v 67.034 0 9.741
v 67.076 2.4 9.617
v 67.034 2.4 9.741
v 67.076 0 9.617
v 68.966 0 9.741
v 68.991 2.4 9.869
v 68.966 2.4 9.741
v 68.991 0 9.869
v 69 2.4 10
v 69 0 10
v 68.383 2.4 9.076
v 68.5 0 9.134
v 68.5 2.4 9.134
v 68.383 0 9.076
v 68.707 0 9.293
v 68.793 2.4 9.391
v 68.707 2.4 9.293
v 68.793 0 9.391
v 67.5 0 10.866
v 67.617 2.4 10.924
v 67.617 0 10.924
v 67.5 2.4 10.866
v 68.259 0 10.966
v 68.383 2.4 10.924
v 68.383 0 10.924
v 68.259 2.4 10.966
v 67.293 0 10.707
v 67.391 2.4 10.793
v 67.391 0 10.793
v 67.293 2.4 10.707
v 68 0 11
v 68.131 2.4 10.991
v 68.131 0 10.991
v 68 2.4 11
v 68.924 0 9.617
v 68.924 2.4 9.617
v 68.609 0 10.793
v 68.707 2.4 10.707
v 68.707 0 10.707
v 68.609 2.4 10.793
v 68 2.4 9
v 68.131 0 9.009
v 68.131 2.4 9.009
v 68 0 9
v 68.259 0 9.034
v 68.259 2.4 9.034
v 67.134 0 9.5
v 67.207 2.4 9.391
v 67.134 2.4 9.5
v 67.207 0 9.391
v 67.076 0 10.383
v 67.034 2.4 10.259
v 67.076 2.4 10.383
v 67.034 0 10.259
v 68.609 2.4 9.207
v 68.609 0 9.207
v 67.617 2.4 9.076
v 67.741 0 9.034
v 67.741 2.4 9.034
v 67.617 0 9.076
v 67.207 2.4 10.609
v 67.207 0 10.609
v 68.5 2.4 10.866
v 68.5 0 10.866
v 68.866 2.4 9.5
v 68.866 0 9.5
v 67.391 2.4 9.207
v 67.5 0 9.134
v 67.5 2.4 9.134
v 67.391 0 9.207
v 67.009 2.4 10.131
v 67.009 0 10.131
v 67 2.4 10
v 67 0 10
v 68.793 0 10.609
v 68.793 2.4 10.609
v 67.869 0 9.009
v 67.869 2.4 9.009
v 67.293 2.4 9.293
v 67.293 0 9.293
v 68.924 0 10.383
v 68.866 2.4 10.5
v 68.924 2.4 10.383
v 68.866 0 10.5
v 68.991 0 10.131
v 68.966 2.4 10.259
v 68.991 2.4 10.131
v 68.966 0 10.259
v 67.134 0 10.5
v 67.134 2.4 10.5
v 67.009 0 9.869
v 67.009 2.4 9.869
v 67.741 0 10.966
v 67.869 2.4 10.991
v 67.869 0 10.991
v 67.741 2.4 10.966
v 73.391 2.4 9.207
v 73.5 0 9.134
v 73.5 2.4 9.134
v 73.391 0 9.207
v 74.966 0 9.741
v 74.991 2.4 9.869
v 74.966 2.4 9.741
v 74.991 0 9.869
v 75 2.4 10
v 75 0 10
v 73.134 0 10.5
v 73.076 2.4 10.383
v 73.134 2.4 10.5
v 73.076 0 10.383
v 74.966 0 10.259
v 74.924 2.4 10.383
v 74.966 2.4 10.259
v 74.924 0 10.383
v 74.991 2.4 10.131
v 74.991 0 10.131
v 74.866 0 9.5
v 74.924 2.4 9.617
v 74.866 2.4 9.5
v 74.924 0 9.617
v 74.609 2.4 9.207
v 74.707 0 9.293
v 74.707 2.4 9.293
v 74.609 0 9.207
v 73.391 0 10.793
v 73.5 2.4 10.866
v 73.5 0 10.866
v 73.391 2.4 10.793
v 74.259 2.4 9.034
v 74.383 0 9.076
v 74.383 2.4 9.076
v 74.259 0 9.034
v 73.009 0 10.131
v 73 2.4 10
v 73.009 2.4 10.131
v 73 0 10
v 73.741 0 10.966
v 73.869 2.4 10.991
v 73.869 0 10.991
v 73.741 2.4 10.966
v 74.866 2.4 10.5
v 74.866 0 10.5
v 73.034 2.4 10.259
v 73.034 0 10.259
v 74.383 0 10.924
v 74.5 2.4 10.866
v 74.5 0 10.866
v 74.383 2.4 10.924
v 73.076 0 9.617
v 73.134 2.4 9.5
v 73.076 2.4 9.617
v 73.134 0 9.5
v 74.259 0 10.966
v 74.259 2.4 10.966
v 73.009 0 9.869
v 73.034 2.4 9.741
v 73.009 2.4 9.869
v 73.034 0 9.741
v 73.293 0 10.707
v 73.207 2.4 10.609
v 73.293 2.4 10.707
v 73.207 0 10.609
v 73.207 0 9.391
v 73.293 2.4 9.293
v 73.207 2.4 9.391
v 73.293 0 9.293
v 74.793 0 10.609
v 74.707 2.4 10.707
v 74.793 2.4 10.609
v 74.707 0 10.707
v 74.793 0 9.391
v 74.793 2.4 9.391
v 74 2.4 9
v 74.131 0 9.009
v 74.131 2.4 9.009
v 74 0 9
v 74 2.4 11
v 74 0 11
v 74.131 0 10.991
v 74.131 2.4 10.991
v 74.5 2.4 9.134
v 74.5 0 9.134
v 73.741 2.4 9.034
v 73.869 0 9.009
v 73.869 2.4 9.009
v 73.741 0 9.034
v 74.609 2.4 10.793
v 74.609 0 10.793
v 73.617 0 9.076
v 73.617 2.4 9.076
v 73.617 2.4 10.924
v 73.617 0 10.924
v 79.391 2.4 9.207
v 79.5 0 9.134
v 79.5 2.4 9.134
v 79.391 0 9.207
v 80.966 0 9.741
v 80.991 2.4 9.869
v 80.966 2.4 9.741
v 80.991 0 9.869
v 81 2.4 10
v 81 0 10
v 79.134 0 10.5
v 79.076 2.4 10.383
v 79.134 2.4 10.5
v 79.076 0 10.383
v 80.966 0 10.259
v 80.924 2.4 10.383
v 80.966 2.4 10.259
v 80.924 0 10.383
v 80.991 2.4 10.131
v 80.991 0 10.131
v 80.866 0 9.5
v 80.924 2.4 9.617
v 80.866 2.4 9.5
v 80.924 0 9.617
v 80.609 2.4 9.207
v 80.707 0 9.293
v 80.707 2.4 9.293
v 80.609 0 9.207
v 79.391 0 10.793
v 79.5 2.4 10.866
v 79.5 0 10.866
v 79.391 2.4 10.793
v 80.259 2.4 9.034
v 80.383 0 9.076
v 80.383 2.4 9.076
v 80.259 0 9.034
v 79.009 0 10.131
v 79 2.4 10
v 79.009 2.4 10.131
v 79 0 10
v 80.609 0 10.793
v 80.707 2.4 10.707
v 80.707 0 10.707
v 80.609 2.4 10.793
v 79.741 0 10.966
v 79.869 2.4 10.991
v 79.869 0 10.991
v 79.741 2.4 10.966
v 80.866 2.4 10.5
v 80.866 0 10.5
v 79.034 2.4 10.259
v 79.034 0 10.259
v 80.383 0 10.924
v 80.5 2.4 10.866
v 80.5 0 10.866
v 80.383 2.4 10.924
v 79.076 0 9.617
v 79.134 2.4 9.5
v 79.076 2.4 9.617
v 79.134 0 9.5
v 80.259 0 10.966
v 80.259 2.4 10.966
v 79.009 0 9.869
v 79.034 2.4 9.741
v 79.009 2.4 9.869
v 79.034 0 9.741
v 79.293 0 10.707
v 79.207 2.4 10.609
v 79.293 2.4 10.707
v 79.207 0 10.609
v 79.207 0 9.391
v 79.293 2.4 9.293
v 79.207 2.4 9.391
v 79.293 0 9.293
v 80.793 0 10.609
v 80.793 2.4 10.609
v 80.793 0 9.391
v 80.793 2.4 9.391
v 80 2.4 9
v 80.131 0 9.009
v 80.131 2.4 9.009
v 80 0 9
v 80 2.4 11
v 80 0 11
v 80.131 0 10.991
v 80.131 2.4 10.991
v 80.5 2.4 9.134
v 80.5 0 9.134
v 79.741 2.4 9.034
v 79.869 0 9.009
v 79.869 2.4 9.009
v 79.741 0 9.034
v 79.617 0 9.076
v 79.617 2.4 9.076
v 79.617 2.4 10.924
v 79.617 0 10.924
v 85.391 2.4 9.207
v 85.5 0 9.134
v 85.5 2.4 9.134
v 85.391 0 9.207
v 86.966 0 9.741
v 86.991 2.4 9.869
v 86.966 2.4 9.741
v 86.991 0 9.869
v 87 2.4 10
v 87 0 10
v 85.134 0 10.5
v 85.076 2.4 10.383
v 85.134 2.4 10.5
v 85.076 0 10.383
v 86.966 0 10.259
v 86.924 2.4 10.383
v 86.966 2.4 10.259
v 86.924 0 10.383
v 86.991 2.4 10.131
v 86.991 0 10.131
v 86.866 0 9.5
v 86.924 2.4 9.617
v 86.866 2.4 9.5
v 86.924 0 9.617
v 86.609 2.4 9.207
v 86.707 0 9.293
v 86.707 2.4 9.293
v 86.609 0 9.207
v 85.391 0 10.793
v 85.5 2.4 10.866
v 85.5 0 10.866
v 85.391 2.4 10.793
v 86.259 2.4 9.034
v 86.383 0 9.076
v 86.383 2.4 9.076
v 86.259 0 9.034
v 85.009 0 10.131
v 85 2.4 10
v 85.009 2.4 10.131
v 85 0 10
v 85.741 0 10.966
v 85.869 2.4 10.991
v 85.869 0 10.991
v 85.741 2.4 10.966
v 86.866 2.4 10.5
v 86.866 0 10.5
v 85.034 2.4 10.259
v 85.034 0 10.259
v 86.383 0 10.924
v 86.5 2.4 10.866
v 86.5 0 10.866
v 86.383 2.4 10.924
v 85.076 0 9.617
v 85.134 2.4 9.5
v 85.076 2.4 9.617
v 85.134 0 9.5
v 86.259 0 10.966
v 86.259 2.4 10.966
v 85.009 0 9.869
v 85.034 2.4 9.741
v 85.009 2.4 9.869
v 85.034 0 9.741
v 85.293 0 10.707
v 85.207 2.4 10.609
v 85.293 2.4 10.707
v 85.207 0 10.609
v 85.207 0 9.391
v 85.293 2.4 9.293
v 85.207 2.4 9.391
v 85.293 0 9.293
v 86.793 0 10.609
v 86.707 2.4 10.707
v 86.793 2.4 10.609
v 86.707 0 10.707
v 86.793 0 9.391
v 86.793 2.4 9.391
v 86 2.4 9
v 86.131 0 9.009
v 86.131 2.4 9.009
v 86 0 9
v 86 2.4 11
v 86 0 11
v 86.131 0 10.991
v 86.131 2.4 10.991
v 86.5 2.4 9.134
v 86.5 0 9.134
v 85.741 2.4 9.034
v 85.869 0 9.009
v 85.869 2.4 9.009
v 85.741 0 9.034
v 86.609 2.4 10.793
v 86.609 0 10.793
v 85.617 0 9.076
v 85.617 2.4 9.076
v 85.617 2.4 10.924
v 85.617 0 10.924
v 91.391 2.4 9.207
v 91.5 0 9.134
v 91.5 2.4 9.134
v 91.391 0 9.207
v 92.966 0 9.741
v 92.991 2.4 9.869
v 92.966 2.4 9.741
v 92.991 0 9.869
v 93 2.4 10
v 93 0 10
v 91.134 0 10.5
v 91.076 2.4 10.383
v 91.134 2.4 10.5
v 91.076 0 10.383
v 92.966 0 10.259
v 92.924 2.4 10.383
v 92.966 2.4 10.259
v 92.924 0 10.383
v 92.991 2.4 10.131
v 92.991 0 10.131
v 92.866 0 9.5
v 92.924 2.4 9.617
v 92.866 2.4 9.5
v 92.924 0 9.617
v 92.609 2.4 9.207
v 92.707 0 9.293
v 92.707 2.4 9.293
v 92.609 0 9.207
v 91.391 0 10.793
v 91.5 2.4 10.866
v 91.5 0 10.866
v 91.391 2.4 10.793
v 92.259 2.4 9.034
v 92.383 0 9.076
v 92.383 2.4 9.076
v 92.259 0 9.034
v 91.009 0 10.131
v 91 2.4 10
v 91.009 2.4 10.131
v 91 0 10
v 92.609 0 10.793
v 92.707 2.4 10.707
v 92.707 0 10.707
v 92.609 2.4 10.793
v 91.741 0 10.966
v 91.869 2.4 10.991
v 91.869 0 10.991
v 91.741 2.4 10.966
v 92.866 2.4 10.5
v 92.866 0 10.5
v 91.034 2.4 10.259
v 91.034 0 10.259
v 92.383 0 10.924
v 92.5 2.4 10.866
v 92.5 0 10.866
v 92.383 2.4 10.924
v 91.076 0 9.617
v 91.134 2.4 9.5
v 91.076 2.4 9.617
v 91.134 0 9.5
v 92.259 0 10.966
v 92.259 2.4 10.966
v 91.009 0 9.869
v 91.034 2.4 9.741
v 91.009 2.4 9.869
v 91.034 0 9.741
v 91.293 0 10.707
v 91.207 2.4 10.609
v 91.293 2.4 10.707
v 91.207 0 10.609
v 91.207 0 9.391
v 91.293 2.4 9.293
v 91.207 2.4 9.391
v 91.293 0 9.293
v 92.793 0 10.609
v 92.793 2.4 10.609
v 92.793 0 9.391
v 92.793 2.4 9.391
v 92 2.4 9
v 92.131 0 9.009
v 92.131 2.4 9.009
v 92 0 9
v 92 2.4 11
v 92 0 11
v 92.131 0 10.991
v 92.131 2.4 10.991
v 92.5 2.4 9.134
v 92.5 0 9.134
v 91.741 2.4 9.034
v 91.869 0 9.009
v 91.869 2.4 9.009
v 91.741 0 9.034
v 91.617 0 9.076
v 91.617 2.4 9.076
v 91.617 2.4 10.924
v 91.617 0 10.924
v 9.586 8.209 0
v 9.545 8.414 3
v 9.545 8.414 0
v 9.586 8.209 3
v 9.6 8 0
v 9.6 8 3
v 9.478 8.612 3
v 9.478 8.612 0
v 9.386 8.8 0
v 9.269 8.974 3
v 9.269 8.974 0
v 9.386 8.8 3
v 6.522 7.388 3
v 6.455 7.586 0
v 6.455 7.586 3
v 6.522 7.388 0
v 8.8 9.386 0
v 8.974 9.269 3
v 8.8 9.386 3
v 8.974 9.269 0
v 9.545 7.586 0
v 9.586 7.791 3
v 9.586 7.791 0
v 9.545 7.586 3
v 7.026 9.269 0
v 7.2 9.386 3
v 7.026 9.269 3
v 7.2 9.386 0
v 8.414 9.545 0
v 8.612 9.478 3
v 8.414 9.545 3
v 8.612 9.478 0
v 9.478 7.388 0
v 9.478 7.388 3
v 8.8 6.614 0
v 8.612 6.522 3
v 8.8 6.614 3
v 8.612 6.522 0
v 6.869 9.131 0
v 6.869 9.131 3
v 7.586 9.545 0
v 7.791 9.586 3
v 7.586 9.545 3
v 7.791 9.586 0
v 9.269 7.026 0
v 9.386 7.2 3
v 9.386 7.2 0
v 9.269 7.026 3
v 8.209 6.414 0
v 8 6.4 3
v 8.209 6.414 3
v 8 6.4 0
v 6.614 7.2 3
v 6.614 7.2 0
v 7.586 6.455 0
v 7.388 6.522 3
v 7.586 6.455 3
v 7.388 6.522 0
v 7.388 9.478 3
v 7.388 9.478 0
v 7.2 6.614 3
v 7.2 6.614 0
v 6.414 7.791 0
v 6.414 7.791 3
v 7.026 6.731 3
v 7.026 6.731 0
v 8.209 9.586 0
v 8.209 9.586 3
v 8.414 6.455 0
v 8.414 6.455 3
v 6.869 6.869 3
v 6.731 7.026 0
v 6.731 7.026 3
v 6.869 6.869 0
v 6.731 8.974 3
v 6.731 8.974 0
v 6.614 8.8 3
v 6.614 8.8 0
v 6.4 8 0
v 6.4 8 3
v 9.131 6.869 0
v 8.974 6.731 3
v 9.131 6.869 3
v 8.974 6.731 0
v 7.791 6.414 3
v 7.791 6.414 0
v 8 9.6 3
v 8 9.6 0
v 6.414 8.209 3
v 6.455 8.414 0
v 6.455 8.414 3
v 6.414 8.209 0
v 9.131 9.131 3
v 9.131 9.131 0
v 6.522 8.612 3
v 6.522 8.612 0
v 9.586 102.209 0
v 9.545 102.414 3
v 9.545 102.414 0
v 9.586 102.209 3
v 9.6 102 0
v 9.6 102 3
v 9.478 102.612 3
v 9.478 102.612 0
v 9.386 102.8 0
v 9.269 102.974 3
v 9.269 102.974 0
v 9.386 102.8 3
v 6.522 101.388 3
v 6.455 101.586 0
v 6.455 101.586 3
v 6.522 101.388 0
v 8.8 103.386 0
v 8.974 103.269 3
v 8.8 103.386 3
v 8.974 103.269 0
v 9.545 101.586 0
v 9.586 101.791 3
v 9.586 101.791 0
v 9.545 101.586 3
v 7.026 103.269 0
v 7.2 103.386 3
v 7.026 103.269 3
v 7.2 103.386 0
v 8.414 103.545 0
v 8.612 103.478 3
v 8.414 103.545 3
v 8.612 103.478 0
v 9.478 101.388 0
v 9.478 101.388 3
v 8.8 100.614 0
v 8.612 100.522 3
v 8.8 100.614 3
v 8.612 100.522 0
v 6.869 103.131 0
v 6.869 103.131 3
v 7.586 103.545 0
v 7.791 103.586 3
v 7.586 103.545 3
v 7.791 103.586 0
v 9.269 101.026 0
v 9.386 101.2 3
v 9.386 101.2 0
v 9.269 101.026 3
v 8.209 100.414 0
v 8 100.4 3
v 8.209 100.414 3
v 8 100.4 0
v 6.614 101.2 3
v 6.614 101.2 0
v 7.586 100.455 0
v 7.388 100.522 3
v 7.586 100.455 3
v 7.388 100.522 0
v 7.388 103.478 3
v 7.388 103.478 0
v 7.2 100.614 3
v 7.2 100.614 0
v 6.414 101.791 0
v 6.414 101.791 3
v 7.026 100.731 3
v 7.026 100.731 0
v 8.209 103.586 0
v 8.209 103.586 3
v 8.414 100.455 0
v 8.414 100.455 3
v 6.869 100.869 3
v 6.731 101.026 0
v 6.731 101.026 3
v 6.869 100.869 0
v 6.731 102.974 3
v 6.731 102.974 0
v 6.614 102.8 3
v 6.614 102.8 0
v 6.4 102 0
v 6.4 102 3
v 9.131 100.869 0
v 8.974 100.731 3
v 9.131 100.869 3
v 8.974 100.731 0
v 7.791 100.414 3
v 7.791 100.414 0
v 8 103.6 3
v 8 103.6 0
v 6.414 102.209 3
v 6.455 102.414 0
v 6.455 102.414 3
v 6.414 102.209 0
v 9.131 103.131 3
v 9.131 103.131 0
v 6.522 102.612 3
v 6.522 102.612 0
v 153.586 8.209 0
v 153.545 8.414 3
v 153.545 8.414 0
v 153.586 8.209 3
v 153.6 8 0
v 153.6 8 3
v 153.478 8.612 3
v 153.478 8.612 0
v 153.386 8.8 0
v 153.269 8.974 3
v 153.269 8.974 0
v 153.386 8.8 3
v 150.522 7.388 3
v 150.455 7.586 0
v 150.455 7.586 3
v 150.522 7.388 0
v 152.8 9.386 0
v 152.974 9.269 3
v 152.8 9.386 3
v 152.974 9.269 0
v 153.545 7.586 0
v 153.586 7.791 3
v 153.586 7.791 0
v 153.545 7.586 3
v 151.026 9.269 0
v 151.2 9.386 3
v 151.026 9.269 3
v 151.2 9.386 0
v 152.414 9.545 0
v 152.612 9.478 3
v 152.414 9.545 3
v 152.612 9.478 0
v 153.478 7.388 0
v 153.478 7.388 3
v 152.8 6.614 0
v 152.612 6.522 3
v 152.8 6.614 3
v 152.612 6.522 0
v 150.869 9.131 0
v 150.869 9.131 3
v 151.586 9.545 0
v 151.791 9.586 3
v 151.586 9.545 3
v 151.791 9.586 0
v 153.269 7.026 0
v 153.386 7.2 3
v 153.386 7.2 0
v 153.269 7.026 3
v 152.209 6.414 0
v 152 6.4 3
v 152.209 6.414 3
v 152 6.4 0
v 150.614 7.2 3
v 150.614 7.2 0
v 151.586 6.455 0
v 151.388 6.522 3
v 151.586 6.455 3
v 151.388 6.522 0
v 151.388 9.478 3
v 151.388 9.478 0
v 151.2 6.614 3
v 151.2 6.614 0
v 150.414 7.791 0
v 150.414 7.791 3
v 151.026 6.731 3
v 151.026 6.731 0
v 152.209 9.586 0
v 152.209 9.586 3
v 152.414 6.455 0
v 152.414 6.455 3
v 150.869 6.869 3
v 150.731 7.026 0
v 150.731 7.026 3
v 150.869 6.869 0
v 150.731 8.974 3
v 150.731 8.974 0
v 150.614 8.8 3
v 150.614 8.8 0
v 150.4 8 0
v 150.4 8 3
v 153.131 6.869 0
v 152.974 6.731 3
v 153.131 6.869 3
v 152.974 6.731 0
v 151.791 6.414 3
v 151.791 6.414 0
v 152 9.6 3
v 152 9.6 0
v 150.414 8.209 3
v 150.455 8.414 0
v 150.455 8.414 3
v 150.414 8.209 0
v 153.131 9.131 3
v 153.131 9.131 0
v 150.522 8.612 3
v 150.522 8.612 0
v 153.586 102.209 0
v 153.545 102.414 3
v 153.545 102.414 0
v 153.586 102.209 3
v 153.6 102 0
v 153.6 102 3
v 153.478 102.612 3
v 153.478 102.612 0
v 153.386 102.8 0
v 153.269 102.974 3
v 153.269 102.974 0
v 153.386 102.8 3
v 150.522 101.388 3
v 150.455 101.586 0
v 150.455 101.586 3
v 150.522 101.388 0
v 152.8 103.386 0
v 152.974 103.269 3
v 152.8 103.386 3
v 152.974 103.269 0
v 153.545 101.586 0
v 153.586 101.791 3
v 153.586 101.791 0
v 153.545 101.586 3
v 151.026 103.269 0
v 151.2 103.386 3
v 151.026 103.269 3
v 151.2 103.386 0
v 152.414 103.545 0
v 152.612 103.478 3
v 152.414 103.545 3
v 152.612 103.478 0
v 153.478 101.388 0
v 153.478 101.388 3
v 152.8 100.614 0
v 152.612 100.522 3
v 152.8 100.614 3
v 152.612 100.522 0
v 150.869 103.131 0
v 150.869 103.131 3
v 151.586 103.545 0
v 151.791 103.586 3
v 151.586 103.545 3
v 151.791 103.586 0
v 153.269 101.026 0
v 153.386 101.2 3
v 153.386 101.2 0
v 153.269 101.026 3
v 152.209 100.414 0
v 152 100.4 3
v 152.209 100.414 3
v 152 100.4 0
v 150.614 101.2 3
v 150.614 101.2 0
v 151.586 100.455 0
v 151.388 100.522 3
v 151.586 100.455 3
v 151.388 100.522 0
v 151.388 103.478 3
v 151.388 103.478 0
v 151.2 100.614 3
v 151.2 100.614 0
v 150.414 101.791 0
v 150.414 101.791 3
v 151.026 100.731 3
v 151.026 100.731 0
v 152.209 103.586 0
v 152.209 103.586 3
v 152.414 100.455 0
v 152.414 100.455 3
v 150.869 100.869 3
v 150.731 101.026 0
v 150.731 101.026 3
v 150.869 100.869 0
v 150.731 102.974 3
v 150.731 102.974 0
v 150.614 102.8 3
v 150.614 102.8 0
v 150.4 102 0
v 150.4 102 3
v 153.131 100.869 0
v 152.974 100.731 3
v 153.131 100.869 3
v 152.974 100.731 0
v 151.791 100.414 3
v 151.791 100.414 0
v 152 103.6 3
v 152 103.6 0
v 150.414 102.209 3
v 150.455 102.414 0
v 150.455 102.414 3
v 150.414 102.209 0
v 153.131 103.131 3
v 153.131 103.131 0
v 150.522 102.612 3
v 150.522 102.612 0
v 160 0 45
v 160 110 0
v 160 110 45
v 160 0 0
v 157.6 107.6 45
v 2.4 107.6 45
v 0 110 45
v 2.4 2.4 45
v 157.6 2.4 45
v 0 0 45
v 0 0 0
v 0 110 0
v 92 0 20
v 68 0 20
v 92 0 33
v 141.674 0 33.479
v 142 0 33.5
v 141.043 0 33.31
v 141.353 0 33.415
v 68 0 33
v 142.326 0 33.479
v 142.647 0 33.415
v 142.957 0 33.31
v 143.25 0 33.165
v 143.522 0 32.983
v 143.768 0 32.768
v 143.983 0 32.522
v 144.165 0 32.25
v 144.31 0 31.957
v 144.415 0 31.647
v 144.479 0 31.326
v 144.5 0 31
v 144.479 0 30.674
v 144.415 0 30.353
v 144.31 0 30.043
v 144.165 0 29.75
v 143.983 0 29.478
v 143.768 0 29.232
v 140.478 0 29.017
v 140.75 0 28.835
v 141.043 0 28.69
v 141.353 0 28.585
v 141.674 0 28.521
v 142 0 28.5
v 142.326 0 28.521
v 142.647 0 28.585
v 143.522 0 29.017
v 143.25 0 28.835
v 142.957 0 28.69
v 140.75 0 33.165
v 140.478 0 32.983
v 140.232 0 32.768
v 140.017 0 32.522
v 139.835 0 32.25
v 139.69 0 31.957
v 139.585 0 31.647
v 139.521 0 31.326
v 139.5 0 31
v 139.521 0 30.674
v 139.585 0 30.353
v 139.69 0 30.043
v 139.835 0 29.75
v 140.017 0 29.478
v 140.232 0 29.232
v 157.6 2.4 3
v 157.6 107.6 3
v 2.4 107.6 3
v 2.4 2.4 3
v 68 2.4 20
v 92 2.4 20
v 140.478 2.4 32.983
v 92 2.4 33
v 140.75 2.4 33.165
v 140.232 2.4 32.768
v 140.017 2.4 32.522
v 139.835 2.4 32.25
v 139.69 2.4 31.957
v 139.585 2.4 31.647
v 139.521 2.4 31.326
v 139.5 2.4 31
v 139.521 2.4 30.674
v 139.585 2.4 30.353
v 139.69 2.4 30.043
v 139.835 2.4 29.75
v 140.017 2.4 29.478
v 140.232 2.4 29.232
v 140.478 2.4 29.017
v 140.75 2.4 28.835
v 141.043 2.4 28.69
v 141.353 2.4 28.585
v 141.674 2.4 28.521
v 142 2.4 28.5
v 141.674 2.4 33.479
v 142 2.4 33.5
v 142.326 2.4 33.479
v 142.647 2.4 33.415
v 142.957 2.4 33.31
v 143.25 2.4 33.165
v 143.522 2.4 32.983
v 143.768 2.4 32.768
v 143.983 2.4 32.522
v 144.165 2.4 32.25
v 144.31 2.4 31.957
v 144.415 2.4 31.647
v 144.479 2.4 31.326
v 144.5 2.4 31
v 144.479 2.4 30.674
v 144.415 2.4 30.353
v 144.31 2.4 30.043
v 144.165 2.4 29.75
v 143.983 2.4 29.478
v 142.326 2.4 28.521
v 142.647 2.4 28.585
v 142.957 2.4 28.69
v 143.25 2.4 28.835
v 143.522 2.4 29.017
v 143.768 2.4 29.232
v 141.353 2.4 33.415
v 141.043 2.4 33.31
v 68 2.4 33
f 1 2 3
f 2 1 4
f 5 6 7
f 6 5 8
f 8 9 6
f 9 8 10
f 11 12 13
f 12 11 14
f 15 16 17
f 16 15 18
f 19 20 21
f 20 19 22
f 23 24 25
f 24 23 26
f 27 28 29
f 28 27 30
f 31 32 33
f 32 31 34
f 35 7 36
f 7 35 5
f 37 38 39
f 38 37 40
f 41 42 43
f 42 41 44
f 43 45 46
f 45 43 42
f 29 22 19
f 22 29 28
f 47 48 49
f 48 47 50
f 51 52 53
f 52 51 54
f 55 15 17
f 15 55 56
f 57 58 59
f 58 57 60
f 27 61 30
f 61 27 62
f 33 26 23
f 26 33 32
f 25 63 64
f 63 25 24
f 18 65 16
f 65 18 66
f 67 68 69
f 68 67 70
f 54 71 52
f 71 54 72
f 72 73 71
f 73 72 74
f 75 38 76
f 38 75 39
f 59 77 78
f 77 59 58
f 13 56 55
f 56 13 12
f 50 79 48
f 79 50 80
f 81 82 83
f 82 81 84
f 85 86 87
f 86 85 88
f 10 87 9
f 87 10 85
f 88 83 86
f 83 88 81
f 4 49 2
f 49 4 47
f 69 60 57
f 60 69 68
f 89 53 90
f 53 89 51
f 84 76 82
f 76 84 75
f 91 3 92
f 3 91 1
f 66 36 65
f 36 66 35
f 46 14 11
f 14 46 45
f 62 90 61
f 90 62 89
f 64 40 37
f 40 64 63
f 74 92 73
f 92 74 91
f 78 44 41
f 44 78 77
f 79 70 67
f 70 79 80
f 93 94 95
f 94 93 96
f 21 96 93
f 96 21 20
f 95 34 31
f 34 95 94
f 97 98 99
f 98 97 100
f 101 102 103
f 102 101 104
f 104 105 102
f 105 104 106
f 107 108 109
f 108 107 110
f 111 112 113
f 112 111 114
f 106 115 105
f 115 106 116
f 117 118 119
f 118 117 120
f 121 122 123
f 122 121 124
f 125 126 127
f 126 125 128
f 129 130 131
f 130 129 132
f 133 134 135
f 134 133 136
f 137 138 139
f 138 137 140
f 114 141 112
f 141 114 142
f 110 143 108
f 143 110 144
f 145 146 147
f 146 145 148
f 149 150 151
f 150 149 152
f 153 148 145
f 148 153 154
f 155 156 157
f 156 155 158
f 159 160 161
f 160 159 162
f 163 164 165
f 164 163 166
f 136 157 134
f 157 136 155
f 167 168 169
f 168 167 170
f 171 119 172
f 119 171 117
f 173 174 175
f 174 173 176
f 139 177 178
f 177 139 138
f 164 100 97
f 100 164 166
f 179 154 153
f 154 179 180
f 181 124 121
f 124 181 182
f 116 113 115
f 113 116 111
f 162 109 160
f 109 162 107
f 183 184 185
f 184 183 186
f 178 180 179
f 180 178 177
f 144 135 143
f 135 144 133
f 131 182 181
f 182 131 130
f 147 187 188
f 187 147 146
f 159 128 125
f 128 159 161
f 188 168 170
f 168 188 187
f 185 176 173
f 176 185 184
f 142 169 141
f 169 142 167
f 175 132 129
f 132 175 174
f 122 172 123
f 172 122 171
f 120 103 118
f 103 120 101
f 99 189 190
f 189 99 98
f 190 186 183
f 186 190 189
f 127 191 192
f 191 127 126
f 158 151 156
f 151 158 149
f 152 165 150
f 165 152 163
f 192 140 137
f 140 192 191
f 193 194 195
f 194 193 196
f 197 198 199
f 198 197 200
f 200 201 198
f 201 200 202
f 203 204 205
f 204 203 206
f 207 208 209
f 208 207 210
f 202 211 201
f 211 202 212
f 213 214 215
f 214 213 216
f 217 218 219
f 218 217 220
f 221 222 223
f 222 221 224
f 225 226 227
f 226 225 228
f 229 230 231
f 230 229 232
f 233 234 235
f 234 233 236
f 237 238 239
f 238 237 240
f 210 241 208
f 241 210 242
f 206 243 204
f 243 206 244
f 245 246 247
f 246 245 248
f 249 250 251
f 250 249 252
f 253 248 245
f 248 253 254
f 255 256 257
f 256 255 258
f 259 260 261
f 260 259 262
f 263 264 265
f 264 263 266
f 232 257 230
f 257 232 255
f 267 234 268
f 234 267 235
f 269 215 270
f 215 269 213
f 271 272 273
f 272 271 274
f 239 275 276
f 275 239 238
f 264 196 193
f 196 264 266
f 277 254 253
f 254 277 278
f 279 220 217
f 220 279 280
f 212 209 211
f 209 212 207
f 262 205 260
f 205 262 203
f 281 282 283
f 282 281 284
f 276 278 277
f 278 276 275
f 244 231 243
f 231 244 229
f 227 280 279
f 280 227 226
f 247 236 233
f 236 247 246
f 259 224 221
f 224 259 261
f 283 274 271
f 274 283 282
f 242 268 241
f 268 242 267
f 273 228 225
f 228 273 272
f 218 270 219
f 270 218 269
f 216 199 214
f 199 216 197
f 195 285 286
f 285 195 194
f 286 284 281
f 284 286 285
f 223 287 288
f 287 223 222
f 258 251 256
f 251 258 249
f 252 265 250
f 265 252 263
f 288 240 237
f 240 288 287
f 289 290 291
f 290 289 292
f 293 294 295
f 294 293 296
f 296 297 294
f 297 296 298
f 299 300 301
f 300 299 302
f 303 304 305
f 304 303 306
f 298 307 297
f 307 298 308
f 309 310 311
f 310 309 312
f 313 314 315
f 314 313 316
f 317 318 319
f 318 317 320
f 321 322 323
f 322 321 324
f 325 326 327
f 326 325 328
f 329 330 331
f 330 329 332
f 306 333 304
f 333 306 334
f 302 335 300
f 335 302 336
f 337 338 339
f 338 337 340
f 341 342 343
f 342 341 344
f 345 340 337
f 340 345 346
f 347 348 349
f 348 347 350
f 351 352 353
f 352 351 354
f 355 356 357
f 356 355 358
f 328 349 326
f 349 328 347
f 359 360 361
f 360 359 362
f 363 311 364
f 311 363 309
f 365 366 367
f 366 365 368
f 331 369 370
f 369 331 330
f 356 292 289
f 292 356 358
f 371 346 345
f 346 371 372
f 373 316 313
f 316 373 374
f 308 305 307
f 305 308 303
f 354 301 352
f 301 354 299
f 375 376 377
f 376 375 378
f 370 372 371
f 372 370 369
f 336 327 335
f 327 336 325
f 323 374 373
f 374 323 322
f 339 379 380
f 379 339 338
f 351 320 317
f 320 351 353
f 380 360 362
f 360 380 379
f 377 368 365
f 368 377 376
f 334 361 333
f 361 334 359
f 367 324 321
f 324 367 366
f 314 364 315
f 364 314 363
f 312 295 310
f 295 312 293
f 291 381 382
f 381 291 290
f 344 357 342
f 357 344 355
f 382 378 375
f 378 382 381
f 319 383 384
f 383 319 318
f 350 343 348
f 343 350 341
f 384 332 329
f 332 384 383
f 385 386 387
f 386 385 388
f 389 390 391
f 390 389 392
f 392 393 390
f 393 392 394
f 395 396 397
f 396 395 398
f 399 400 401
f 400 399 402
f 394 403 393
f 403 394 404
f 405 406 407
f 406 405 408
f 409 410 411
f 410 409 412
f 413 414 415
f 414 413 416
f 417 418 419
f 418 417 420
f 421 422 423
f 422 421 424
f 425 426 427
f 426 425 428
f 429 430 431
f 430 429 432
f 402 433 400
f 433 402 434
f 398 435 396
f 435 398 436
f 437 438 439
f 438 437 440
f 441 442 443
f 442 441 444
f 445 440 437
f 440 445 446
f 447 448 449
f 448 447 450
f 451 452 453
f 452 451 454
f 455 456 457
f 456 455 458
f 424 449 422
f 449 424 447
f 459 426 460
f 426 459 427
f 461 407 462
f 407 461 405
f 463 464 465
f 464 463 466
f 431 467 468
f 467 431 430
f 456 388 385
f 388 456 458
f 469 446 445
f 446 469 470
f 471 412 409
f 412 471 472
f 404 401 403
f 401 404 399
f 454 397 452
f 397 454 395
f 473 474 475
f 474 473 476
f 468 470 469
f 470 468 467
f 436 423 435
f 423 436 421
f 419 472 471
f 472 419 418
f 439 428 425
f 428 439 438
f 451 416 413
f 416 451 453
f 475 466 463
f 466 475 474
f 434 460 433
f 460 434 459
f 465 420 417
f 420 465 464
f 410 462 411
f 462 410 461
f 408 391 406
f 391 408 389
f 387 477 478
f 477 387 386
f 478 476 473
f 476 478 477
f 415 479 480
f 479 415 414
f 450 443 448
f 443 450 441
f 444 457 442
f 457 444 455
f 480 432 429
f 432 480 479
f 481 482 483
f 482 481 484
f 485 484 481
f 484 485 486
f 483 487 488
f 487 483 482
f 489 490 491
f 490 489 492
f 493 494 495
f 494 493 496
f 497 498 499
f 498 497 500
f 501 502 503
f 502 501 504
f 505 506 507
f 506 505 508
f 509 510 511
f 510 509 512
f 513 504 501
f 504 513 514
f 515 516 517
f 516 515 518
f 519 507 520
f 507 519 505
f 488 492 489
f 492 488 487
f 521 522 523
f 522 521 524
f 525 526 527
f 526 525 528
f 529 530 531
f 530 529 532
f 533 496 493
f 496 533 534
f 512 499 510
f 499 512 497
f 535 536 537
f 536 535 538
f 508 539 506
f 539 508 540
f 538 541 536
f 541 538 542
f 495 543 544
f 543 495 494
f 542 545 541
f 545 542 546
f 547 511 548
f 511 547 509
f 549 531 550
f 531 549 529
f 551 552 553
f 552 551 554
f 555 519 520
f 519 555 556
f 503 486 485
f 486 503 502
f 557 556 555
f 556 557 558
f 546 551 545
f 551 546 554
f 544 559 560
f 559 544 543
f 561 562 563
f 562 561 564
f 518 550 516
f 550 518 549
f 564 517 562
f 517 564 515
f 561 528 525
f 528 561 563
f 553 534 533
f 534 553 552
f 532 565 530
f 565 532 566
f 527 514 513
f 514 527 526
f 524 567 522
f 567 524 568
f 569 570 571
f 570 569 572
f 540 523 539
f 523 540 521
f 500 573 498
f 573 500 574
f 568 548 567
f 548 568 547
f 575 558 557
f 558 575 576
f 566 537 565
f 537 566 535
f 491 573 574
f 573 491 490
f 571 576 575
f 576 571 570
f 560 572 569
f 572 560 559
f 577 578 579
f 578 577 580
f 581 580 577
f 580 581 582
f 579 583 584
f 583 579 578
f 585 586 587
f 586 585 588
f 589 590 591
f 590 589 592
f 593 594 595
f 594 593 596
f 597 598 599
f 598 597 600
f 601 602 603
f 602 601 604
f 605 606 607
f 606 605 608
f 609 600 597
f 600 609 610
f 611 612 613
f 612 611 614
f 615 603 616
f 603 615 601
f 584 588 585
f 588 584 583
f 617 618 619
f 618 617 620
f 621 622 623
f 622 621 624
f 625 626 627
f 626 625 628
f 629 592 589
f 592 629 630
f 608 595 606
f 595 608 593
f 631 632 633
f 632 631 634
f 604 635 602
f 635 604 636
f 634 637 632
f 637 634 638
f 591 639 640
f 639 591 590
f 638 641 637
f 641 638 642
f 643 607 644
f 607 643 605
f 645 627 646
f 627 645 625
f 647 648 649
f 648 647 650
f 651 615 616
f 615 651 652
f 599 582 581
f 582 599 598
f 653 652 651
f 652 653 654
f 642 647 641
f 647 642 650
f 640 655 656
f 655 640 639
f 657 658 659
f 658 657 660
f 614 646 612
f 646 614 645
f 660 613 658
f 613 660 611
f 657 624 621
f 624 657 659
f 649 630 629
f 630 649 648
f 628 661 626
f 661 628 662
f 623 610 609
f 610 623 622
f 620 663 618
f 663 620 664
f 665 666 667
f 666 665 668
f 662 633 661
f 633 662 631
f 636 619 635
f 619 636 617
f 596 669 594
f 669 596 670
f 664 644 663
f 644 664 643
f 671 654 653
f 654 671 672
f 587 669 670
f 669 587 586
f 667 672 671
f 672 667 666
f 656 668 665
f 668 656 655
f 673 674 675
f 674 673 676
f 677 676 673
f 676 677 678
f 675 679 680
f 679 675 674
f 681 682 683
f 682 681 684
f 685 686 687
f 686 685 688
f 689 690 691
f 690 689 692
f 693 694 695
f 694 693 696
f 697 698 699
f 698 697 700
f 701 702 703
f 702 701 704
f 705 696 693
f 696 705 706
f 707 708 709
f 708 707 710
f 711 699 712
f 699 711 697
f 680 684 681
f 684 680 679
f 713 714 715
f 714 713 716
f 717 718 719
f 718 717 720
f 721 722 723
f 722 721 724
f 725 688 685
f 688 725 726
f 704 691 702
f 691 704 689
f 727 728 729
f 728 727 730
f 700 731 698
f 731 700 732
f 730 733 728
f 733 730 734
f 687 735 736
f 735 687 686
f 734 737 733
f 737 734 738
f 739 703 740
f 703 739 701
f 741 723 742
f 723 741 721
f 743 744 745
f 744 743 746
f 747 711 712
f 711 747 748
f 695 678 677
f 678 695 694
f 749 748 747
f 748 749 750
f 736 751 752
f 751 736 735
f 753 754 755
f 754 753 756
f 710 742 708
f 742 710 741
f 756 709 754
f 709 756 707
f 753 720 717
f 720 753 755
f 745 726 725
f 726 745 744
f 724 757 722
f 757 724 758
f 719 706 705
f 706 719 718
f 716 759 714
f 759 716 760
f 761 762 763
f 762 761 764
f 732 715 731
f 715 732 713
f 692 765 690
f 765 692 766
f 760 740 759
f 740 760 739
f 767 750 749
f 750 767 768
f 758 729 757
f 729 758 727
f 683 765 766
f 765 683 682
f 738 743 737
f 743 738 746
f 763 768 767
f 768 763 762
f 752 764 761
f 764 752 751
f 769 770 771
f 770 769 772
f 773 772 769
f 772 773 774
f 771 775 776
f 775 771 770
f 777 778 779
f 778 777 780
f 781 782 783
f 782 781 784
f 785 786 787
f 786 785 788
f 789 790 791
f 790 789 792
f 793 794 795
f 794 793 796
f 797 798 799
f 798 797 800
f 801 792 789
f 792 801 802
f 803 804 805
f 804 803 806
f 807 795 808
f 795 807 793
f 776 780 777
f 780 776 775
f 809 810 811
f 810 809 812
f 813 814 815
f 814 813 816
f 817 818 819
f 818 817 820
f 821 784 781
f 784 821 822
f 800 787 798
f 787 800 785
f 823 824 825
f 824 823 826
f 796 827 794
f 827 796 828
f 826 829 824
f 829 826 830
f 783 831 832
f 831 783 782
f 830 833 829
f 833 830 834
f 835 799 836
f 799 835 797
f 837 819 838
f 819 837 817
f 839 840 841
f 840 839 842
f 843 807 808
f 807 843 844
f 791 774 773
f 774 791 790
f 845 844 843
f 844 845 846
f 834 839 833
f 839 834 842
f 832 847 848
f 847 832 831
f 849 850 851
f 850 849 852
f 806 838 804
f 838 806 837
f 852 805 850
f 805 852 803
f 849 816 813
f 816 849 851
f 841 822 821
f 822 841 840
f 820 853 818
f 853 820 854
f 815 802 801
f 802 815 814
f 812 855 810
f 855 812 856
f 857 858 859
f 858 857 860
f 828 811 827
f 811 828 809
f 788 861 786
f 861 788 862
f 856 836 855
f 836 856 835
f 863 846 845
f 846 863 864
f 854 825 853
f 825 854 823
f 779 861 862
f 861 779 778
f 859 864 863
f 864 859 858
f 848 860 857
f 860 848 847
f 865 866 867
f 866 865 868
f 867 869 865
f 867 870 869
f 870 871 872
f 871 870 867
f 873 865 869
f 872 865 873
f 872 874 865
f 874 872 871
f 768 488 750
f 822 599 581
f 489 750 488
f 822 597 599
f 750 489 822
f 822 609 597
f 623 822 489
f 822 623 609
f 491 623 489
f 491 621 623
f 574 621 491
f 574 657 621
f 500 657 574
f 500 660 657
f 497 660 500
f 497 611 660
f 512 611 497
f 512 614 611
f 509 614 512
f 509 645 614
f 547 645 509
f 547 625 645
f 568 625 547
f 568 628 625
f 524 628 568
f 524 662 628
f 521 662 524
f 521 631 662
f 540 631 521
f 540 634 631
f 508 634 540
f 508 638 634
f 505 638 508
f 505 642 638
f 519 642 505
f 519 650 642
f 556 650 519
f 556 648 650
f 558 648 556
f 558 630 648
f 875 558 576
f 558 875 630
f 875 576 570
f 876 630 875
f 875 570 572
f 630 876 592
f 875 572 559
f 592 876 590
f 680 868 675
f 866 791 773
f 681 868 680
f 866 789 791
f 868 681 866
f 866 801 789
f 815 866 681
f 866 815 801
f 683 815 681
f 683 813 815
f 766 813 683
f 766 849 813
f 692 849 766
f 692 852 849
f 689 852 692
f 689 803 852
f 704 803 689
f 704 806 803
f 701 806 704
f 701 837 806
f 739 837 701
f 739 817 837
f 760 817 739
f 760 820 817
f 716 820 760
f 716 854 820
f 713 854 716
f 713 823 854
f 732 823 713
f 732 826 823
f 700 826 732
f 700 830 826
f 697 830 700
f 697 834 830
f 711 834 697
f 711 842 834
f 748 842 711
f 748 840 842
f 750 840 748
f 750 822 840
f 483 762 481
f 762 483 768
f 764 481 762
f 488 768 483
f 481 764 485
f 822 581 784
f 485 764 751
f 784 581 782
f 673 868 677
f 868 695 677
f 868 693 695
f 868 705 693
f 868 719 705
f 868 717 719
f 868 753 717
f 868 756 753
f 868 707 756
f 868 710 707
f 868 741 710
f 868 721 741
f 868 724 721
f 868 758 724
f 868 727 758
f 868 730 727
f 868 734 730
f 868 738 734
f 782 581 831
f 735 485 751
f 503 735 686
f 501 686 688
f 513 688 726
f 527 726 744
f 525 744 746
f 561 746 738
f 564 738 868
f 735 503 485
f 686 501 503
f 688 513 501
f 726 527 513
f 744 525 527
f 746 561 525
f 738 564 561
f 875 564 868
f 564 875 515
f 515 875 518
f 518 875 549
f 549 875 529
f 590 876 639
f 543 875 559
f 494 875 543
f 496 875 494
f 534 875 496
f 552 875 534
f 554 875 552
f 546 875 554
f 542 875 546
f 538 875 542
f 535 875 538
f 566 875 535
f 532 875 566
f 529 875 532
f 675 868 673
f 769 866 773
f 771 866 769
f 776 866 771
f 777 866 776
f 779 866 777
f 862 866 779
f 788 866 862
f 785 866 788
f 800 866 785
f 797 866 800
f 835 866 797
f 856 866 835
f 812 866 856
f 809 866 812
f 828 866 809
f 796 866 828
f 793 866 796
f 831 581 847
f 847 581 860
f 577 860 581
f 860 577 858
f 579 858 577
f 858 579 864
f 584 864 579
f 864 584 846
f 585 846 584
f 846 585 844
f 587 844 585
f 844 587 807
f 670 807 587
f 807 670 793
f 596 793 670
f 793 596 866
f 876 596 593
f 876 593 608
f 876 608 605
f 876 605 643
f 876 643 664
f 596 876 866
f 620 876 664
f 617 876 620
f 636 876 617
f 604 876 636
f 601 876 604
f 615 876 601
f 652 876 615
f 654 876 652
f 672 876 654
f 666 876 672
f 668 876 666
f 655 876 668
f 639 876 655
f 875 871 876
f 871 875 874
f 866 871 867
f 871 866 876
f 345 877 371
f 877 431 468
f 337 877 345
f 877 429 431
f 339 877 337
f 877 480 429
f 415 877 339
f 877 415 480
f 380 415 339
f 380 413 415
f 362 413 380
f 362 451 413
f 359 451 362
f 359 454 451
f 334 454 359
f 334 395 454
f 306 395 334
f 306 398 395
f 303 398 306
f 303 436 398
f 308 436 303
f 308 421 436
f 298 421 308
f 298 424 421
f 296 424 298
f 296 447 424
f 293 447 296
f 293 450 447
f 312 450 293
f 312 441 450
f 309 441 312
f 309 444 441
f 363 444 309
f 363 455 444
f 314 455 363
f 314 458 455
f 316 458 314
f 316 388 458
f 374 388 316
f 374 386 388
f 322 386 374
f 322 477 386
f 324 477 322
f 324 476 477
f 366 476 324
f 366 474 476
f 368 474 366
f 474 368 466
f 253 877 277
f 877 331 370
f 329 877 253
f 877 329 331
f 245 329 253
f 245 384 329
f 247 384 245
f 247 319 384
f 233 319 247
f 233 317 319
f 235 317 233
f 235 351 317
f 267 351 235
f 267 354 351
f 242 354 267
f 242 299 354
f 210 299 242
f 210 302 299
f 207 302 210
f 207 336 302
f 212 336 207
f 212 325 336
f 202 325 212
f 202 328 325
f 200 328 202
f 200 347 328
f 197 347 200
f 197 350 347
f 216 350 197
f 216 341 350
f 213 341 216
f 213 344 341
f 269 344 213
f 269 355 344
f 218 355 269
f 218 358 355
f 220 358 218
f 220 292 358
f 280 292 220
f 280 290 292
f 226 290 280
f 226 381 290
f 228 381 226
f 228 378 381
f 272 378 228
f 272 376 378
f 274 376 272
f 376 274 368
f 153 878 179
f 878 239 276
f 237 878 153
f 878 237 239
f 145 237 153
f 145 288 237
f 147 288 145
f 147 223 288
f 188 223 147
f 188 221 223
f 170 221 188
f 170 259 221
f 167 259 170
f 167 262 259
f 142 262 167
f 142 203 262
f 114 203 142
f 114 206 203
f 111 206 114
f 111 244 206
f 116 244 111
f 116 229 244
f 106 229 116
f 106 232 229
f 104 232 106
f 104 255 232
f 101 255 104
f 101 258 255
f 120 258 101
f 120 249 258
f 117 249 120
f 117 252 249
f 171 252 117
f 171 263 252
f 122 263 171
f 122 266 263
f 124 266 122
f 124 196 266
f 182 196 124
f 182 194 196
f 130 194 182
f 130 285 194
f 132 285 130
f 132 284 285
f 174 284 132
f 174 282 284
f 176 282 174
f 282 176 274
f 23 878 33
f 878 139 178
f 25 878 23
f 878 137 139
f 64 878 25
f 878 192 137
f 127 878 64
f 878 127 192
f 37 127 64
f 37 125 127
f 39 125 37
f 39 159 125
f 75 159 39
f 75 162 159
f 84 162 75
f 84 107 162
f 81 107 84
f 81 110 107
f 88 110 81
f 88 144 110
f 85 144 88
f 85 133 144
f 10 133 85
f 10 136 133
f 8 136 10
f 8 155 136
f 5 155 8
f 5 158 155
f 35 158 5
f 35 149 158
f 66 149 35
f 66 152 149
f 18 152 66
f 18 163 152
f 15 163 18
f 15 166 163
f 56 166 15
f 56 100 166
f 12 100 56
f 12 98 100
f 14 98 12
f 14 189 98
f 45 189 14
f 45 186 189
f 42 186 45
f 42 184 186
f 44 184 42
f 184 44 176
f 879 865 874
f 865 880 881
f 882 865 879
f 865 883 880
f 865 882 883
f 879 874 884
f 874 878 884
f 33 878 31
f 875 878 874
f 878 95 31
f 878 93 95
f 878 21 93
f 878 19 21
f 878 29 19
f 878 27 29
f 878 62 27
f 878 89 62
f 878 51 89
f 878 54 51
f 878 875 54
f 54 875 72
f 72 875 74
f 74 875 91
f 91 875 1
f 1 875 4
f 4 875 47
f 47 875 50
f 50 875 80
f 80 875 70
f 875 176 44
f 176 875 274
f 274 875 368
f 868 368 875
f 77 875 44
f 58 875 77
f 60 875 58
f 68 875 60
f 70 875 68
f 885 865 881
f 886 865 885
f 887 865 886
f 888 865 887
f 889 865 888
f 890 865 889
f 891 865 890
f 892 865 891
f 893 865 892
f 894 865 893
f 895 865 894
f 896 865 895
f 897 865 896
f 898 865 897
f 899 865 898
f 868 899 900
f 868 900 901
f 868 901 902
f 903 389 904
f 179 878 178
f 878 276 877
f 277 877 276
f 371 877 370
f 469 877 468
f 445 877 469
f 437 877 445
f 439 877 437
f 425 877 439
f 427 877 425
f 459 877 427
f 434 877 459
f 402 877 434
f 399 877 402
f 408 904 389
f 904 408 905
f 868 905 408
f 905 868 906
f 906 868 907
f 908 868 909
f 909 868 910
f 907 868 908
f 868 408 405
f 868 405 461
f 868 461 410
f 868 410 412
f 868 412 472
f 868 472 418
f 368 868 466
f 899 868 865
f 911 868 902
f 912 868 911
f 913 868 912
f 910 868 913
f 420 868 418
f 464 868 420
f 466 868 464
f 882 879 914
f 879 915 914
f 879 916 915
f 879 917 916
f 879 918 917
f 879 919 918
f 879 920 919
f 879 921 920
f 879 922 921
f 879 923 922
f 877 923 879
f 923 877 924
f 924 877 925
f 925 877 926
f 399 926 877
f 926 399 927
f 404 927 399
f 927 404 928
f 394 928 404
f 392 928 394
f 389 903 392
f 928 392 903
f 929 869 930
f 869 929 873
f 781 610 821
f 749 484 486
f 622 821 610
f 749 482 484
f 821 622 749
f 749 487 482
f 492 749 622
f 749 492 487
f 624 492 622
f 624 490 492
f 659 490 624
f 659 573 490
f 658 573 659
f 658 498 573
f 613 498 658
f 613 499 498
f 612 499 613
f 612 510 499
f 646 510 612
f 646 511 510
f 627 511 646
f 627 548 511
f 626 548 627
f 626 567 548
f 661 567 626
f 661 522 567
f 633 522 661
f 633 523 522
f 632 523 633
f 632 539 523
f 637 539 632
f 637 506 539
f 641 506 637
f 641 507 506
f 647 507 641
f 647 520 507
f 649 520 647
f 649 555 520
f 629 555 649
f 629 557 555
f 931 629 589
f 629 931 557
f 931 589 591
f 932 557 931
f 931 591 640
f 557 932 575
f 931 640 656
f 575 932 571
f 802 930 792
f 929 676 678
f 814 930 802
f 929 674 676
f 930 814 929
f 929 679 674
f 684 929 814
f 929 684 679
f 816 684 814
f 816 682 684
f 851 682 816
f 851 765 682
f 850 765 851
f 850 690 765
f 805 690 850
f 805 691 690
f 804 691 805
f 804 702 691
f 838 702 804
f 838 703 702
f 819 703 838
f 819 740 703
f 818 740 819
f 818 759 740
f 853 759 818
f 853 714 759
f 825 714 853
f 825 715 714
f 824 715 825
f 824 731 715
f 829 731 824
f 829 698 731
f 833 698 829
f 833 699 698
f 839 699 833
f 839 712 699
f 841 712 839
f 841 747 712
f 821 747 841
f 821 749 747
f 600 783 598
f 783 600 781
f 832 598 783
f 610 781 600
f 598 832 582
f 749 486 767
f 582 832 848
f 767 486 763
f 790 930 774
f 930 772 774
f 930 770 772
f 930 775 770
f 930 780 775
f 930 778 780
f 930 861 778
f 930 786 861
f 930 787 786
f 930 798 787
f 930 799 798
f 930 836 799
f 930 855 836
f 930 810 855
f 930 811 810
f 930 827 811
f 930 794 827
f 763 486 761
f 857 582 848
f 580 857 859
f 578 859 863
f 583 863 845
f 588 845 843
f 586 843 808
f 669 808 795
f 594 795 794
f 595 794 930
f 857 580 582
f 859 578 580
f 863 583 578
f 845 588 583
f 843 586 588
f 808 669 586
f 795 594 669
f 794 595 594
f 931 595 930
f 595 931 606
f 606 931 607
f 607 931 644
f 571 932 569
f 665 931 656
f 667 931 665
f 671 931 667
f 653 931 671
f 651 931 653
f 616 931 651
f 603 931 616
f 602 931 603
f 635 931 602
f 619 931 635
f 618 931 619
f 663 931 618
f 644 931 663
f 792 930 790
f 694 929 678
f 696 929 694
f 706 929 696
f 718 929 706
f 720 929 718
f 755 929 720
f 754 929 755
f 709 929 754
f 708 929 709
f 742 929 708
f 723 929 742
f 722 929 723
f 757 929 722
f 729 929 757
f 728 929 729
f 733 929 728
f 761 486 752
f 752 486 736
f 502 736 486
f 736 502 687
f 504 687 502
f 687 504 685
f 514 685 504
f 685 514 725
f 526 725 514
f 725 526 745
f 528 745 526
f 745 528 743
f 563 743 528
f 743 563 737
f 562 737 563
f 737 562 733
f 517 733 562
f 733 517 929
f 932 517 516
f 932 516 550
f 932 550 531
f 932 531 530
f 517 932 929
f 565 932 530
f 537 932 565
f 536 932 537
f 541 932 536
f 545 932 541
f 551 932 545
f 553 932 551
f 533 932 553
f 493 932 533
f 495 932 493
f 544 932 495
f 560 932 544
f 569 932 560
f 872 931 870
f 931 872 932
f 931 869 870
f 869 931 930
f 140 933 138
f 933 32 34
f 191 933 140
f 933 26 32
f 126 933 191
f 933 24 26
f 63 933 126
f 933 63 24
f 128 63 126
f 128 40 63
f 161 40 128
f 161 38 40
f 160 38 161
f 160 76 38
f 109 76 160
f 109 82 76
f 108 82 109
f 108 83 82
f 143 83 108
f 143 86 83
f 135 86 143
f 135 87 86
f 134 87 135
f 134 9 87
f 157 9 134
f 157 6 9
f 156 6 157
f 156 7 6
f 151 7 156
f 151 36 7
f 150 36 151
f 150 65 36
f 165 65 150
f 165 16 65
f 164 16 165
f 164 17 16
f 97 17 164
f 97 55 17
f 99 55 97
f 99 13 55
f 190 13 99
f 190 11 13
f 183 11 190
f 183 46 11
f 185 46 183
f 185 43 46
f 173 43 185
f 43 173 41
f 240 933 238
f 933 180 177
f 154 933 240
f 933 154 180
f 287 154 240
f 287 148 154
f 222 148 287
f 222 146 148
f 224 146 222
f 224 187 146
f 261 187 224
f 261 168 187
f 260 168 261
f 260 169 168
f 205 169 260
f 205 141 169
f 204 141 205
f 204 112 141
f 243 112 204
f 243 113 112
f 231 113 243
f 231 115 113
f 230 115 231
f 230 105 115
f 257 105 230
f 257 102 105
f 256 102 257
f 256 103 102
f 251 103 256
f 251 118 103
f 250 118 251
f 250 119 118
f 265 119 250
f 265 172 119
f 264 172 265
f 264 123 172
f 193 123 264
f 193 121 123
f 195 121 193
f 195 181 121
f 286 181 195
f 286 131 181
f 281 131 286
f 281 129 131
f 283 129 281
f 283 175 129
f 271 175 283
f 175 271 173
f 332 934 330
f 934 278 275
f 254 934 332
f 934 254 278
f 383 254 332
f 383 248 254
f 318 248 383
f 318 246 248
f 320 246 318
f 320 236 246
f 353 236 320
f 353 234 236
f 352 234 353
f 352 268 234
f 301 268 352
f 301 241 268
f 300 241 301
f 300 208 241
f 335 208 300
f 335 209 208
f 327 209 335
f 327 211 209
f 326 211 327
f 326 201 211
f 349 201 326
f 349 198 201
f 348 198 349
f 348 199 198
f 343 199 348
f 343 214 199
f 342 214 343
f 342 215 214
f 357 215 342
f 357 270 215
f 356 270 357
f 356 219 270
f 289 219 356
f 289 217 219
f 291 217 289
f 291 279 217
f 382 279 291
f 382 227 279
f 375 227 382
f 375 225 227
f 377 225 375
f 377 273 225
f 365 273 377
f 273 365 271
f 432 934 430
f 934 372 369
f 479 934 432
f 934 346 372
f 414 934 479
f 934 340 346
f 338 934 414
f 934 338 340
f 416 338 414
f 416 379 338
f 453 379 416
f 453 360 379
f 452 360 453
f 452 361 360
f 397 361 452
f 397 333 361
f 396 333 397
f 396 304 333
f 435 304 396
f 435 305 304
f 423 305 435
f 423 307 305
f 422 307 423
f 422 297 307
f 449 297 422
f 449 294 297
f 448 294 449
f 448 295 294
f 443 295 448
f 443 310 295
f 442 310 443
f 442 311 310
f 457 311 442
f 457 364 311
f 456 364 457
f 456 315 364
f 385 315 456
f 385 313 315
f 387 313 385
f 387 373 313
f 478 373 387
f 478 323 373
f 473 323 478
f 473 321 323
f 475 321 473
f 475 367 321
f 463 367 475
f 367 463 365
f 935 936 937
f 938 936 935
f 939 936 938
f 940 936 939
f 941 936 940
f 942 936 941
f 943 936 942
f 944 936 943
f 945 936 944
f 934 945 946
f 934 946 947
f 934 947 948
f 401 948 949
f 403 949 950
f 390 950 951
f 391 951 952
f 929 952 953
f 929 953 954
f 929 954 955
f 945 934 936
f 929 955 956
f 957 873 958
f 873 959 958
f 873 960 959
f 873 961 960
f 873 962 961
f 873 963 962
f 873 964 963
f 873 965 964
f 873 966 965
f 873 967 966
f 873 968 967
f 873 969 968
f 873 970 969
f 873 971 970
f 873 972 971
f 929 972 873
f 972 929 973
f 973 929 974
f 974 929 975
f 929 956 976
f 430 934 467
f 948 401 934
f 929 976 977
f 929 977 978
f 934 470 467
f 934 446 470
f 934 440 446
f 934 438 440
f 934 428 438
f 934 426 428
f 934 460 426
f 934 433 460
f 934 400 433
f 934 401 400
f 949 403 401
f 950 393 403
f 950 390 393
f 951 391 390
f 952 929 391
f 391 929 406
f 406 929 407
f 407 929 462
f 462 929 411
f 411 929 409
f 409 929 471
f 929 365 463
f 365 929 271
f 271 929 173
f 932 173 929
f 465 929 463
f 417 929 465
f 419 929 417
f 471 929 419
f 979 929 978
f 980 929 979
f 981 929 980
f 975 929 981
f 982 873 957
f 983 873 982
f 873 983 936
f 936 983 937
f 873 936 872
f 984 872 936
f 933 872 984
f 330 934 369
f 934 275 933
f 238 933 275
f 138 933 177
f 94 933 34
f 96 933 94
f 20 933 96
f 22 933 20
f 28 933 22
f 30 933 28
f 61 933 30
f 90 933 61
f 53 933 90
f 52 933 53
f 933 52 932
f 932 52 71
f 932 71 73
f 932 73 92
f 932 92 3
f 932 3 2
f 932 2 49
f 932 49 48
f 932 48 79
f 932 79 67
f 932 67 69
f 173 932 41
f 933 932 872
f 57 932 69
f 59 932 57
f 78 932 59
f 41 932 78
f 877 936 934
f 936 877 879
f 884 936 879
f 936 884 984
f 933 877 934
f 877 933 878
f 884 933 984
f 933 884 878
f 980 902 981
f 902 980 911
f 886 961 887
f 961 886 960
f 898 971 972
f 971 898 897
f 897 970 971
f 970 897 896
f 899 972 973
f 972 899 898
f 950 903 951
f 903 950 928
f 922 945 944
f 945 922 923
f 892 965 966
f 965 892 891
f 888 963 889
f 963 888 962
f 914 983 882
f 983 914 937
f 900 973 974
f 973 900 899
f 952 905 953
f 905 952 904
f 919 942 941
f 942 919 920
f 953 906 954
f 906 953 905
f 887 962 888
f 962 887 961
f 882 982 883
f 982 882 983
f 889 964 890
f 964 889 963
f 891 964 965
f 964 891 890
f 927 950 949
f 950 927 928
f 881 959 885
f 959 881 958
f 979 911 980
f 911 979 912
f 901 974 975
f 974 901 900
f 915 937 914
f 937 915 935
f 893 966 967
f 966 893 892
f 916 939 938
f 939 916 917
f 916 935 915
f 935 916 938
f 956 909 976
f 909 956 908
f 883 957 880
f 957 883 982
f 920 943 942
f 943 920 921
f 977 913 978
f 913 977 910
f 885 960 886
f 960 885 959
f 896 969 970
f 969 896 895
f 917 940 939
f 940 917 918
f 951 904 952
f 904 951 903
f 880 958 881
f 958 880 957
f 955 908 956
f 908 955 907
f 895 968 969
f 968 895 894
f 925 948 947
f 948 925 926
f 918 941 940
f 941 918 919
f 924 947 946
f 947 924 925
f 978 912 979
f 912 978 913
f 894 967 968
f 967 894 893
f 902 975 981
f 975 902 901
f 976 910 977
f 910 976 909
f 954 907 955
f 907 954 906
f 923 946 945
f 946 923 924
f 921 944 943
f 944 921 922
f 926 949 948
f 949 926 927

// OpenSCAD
// Smart Kitchen LPG Gas Safety System
// Editable OpenSCAD enclosure
// Units: millimetres
// Prototype dimensions: 160 x 110 x 45 mm

$fn = 48;

// Main dimensions
length = 160;
width = 110;
height = 45;
wall = 2.4;
floor_thickness = 3;

// Select model:
// "base" = enclosure base
// "lid" = enclosure lid
// "assembly" = preview of both parts
part = "base";

// Lid parameters
lid_thickness = 3;
lid_overlap = 1.5;

// OLED opening
oled_width = 24;
oled_height = 13;

// Mounting holes
hole_diameter = 3.2;
hole_offset = 8;

// Main base
module enclosure_base() {
difference() {
cube([length, width, height]);

    // Hollow interior, leaving floor and walls
    translate([wall, wall, floor_thickness])
        cube([
            length - 2*wall,
            width - 2*wall,
            height
        ]);

    // OLED opening on front wall
    translate([
        (length - oled_width)/2,
        -0.1,
        20
    ])
        cube([oled_width, wall + 0.2, oled_height]);

    // Buzzer sound holes on front wall
    for (x = [-12, -6, 0, 6, 12])
        translate([
            length/2 + x,
            -0.1,
            10
        ])
            rotate([-90, 0, 0])
                cylinder(h = wall + 0.2, d = 2);

    // LED opening on front wall
    translate([length - 18, -0.1, 31])
        rotate([-90, 0, 0])
            cylinder(h = wall + 0.2, d = 5);

    // Four floor mounting holes
    for (x = [hole_offset, length-hole_offset])
        for (y = [hole_offset, width-hole_offset])
            translate([x, y, -0.1])
                cylinder(
                    h = floor_thickness + 0.2,
                    d = hole_diameter
                );
}

}

// Separate lid
module enclosure_lid() {
difference() {
cube([
length,
width,
lid_thickness
]);

    // Screw holes near the corners
    for (x = [hole_offset, length-hole_offset])
        for (y = [hole_offset, width-hole_offset])
            translate([x, y, -0.1])
                cylinder(
                    h = lid_thickness + 0.2,
                    d = hole_diameter
                );
}

}

// Display selected part
if (part == "base") {
enclosure_base();
}
else if (part == "lid") {
enclosure_lid();
}
else if (part == "assembly") {
color("lightgray")
enclosure_base();

color("silver")
    translate([0, 0, height])
        enclosure_lid();

}
